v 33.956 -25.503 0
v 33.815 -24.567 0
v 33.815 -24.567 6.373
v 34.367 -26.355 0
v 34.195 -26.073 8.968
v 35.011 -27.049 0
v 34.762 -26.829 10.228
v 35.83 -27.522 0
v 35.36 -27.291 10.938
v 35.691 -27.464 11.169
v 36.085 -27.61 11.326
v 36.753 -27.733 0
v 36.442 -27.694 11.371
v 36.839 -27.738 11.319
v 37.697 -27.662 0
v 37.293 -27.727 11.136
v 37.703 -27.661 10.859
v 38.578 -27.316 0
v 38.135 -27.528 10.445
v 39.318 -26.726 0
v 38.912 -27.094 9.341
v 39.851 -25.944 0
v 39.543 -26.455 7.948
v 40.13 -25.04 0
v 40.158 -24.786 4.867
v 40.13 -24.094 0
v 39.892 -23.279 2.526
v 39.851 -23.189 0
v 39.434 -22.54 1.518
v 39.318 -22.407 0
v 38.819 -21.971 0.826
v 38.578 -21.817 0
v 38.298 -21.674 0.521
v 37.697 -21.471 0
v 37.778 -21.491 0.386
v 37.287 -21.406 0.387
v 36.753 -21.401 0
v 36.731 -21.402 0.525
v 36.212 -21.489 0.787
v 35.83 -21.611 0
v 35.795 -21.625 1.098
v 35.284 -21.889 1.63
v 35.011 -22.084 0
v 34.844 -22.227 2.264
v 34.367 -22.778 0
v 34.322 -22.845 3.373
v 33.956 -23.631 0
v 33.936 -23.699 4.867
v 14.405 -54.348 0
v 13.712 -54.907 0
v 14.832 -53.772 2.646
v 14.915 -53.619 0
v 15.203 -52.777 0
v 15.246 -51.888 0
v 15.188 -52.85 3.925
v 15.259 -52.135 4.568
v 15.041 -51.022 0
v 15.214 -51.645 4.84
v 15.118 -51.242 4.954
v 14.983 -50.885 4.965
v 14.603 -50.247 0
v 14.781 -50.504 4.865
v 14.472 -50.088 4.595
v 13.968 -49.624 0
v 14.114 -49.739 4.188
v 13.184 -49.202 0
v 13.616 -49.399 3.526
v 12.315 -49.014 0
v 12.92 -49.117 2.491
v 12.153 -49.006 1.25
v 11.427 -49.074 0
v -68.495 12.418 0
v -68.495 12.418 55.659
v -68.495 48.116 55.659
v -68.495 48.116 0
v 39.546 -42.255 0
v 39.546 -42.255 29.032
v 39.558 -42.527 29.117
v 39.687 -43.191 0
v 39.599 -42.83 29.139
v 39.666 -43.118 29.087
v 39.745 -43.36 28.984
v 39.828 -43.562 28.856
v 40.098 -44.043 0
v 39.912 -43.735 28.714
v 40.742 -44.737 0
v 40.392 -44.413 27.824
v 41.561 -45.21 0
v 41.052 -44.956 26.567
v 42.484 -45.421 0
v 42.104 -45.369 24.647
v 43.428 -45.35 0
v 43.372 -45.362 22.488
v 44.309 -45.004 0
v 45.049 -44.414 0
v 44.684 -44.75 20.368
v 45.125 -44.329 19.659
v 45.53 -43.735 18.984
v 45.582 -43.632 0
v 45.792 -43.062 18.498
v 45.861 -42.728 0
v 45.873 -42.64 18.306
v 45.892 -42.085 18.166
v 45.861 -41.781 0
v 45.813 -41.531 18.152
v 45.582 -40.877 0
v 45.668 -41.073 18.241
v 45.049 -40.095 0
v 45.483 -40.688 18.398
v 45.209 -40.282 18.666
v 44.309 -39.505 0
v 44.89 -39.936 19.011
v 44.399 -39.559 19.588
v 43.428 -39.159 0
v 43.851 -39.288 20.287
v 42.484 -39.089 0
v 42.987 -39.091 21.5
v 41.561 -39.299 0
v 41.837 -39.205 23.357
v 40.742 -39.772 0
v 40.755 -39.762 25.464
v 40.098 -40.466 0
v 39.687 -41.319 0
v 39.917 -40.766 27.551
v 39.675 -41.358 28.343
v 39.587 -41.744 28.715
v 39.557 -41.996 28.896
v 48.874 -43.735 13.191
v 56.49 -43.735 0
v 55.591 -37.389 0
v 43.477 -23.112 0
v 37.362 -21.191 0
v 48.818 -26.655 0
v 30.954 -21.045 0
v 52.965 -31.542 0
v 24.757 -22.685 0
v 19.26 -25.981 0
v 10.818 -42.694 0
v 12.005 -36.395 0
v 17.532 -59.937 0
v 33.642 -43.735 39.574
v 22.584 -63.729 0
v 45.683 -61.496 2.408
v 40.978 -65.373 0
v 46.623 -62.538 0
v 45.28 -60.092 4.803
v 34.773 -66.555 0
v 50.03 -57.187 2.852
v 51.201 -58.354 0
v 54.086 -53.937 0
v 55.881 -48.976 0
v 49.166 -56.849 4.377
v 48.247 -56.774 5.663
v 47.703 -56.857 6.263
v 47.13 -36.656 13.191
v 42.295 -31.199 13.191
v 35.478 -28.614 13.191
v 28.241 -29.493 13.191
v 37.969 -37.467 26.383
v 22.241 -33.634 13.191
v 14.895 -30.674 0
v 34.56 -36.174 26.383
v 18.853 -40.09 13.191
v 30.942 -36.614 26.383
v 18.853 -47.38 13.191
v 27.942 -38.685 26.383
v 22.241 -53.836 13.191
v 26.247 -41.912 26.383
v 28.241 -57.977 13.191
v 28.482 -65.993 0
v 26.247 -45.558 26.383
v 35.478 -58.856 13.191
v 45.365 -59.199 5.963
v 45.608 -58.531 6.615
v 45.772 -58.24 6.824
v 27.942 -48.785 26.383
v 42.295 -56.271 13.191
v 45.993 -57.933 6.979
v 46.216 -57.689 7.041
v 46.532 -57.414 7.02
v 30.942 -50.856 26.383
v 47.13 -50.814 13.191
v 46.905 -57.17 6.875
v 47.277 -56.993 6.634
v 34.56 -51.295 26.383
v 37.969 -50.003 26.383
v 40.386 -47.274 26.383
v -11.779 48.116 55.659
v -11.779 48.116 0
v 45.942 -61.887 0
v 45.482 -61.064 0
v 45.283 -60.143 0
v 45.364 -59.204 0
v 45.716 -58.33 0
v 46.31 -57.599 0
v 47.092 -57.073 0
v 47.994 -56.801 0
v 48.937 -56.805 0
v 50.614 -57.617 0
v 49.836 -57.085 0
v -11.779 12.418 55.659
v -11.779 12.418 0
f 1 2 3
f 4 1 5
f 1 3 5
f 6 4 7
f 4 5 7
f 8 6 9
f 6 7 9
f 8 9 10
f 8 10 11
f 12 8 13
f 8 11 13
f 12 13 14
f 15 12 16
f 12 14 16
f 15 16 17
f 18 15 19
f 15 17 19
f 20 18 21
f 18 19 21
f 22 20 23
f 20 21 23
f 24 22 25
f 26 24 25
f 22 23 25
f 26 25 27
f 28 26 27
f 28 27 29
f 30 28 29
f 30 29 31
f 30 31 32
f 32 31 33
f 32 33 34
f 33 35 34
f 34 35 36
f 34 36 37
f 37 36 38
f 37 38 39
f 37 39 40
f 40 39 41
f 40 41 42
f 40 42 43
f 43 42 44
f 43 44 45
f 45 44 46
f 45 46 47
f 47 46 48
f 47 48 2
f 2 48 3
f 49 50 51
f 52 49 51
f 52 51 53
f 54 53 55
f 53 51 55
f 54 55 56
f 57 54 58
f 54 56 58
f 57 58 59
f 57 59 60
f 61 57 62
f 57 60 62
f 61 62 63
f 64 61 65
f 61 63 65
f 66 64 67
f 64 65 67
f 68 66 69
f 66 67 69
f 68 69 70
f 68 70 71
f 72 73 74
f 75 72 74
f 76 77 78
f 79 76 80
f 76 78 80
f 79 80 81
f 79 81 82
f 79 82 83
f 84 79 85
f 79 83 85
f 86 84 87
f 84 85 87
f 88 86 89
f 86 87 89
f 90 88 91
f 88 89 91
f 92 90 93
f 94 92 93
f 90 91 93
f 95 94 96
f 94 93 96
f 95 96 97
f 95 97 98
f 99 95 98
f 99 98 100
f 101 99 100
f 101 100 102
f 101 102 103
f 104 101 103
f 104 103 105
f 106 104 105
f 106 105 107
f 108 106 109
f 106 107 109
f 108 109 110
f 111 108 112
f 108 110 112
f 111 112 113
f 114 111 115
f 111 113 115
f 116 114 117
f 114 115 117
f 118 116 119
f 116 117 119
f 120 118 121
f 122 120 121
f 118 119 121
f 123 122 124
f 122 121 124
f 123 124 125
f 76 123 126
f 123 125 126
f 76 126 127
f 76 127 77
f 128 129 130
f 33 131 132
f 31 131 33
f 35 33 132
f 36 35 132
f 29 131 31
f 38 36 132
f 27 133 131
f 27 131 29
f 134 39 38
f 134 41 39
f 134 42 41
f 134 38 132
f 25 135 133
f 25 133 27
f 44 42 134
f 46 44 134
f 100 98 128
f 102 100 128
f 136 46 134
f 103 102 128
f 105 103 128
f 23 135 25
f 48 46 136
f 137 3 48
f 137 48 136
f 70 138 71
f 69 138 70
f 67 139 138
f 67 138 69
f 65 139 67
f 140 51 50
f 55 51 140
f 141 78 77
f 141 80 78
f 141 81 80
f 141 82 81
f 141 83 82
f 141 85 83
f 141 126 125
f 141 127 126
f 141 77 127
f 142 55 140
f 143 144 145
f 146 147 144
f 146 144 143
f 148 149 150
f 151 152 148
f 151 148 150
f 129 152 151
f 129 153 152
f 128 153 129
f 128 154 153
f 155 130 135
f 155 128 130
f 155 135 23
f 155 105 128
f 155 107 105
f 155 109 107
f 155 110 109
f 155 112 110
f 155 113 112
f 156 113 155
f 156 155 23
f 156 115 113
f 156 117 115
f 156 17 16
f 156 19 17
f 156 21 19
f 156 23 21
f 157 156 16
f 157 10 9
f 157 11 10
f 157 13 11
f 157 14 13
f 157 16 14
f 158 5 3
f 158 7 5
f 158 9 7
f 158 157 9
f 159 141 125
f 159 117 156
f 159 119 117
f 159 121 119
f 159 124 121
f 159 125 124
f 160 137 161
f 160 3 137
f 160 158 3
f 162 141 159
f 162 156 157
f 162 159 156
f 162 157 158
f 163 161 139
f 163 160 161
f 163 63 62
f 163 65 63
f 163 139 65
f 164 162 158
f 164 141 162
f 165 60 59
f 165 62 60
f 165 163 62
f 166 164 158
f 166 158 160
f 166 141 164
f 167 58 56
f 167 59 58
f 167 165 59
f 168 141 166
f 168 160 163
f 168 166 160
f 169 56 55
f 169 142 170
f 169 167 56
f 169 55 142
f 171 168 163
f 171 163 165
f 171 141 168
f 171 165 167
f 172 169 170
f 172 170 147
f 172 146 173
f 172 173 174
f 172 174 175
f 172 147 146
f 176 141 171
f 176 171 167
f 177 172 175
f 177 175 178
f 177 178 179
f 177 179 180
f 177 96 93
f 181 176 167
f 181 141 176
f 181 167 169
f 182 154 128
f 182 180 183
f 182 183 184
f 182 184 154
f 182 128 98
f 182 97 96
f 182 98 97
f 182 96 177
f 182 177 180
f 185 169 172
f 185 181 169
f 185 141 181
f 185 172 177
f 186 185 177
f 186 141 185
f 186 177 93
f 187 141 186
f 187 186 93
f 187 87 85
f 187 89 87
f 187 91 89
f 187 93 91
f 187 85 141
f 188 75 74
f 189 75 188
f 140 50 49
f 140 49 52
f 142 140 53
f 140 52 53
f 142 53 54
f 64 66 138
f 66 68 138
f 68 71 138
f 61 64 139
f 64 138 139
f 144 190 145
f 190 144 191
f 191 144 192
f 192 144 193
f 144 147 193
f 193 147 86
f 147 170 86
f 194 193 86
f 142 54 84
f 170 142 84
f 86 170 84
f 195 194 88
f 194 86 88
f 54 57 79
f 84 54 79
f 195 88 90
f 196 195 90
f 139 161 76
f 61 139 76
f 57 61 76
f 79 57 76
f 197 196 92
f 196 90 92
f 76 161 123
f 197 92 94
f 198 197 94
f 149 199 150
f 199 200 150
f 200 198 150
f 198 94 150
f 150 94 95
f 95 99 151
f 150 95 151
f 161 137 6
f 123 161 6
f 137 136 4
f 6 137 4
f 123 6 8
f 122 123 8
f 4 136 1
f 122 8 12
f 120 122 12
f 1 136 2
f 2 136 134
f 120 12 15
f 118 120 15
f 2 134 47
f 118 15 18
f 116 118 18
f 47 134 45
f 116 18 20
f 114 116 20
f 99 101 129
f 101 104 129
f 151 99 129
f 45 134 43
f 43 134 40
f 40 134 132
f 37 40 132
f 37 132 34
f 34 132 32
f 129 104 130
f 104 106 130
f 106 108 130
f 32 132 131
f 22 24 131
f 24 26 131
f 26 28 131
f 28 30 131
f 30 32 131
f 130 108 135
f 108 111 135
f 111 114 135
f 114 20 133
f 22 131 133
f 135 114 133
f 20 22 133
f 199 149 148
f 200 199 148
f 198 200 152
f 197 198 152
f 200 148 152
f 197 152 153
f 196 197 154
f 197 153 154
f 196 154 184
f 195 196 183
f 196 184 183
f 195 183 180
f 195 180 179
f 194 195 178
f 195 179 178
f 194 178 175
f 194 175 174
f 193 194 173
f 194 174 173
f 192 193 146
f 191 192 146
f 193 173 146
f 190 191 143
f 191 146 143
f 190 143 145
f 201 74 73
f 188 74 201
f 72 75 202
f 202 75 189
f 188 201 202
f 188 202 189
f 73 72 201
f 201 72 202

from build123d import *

# Parameters (mm, degrees)
F0_W     = 56.7160658538
F0_H     = 35.6977619231
F1_DEPTH = 55.65923
F2_R     = 22.8481885107
F3_DEPTH = 43.99779
F3_TAPER = 30
F5_D     = 6.35


with BuildPart() as f1:
    # F0 (on Top) → F1 (new body)
    with BuildSketch(Plane.XY):
        with Locations((-40.1368830353, 30.2669946104)):
            Rectangle(F0_W, F0_H)
    extrude(amount=F1_DEPTH)


with BuildPart() as f3:
    # F2 (on Top) → F3 (new body)
    with BuildSketch(Plane.XY):
        with Locations((33.6422324181, -43.7349006534)):
            Circle(F2_R)
    extrude(amount=F3_DEPTH, taper=F3_TAPER)

    # F5 (through all)
    with Locations(Plane(origin=(0, 0, 0), x_dir=(1, 0, 0), z_dir=(0, 0, -1))):
        with Locations((42.7210853135, 42.2546694808), (36.9903769734, 24.5667850618), (12.0847708214, 52.1805474892), (48.4517936536, 59.9425538998)):
            Hole(F5_D / 2)


solid = Compound([f1.part, f3.part])
